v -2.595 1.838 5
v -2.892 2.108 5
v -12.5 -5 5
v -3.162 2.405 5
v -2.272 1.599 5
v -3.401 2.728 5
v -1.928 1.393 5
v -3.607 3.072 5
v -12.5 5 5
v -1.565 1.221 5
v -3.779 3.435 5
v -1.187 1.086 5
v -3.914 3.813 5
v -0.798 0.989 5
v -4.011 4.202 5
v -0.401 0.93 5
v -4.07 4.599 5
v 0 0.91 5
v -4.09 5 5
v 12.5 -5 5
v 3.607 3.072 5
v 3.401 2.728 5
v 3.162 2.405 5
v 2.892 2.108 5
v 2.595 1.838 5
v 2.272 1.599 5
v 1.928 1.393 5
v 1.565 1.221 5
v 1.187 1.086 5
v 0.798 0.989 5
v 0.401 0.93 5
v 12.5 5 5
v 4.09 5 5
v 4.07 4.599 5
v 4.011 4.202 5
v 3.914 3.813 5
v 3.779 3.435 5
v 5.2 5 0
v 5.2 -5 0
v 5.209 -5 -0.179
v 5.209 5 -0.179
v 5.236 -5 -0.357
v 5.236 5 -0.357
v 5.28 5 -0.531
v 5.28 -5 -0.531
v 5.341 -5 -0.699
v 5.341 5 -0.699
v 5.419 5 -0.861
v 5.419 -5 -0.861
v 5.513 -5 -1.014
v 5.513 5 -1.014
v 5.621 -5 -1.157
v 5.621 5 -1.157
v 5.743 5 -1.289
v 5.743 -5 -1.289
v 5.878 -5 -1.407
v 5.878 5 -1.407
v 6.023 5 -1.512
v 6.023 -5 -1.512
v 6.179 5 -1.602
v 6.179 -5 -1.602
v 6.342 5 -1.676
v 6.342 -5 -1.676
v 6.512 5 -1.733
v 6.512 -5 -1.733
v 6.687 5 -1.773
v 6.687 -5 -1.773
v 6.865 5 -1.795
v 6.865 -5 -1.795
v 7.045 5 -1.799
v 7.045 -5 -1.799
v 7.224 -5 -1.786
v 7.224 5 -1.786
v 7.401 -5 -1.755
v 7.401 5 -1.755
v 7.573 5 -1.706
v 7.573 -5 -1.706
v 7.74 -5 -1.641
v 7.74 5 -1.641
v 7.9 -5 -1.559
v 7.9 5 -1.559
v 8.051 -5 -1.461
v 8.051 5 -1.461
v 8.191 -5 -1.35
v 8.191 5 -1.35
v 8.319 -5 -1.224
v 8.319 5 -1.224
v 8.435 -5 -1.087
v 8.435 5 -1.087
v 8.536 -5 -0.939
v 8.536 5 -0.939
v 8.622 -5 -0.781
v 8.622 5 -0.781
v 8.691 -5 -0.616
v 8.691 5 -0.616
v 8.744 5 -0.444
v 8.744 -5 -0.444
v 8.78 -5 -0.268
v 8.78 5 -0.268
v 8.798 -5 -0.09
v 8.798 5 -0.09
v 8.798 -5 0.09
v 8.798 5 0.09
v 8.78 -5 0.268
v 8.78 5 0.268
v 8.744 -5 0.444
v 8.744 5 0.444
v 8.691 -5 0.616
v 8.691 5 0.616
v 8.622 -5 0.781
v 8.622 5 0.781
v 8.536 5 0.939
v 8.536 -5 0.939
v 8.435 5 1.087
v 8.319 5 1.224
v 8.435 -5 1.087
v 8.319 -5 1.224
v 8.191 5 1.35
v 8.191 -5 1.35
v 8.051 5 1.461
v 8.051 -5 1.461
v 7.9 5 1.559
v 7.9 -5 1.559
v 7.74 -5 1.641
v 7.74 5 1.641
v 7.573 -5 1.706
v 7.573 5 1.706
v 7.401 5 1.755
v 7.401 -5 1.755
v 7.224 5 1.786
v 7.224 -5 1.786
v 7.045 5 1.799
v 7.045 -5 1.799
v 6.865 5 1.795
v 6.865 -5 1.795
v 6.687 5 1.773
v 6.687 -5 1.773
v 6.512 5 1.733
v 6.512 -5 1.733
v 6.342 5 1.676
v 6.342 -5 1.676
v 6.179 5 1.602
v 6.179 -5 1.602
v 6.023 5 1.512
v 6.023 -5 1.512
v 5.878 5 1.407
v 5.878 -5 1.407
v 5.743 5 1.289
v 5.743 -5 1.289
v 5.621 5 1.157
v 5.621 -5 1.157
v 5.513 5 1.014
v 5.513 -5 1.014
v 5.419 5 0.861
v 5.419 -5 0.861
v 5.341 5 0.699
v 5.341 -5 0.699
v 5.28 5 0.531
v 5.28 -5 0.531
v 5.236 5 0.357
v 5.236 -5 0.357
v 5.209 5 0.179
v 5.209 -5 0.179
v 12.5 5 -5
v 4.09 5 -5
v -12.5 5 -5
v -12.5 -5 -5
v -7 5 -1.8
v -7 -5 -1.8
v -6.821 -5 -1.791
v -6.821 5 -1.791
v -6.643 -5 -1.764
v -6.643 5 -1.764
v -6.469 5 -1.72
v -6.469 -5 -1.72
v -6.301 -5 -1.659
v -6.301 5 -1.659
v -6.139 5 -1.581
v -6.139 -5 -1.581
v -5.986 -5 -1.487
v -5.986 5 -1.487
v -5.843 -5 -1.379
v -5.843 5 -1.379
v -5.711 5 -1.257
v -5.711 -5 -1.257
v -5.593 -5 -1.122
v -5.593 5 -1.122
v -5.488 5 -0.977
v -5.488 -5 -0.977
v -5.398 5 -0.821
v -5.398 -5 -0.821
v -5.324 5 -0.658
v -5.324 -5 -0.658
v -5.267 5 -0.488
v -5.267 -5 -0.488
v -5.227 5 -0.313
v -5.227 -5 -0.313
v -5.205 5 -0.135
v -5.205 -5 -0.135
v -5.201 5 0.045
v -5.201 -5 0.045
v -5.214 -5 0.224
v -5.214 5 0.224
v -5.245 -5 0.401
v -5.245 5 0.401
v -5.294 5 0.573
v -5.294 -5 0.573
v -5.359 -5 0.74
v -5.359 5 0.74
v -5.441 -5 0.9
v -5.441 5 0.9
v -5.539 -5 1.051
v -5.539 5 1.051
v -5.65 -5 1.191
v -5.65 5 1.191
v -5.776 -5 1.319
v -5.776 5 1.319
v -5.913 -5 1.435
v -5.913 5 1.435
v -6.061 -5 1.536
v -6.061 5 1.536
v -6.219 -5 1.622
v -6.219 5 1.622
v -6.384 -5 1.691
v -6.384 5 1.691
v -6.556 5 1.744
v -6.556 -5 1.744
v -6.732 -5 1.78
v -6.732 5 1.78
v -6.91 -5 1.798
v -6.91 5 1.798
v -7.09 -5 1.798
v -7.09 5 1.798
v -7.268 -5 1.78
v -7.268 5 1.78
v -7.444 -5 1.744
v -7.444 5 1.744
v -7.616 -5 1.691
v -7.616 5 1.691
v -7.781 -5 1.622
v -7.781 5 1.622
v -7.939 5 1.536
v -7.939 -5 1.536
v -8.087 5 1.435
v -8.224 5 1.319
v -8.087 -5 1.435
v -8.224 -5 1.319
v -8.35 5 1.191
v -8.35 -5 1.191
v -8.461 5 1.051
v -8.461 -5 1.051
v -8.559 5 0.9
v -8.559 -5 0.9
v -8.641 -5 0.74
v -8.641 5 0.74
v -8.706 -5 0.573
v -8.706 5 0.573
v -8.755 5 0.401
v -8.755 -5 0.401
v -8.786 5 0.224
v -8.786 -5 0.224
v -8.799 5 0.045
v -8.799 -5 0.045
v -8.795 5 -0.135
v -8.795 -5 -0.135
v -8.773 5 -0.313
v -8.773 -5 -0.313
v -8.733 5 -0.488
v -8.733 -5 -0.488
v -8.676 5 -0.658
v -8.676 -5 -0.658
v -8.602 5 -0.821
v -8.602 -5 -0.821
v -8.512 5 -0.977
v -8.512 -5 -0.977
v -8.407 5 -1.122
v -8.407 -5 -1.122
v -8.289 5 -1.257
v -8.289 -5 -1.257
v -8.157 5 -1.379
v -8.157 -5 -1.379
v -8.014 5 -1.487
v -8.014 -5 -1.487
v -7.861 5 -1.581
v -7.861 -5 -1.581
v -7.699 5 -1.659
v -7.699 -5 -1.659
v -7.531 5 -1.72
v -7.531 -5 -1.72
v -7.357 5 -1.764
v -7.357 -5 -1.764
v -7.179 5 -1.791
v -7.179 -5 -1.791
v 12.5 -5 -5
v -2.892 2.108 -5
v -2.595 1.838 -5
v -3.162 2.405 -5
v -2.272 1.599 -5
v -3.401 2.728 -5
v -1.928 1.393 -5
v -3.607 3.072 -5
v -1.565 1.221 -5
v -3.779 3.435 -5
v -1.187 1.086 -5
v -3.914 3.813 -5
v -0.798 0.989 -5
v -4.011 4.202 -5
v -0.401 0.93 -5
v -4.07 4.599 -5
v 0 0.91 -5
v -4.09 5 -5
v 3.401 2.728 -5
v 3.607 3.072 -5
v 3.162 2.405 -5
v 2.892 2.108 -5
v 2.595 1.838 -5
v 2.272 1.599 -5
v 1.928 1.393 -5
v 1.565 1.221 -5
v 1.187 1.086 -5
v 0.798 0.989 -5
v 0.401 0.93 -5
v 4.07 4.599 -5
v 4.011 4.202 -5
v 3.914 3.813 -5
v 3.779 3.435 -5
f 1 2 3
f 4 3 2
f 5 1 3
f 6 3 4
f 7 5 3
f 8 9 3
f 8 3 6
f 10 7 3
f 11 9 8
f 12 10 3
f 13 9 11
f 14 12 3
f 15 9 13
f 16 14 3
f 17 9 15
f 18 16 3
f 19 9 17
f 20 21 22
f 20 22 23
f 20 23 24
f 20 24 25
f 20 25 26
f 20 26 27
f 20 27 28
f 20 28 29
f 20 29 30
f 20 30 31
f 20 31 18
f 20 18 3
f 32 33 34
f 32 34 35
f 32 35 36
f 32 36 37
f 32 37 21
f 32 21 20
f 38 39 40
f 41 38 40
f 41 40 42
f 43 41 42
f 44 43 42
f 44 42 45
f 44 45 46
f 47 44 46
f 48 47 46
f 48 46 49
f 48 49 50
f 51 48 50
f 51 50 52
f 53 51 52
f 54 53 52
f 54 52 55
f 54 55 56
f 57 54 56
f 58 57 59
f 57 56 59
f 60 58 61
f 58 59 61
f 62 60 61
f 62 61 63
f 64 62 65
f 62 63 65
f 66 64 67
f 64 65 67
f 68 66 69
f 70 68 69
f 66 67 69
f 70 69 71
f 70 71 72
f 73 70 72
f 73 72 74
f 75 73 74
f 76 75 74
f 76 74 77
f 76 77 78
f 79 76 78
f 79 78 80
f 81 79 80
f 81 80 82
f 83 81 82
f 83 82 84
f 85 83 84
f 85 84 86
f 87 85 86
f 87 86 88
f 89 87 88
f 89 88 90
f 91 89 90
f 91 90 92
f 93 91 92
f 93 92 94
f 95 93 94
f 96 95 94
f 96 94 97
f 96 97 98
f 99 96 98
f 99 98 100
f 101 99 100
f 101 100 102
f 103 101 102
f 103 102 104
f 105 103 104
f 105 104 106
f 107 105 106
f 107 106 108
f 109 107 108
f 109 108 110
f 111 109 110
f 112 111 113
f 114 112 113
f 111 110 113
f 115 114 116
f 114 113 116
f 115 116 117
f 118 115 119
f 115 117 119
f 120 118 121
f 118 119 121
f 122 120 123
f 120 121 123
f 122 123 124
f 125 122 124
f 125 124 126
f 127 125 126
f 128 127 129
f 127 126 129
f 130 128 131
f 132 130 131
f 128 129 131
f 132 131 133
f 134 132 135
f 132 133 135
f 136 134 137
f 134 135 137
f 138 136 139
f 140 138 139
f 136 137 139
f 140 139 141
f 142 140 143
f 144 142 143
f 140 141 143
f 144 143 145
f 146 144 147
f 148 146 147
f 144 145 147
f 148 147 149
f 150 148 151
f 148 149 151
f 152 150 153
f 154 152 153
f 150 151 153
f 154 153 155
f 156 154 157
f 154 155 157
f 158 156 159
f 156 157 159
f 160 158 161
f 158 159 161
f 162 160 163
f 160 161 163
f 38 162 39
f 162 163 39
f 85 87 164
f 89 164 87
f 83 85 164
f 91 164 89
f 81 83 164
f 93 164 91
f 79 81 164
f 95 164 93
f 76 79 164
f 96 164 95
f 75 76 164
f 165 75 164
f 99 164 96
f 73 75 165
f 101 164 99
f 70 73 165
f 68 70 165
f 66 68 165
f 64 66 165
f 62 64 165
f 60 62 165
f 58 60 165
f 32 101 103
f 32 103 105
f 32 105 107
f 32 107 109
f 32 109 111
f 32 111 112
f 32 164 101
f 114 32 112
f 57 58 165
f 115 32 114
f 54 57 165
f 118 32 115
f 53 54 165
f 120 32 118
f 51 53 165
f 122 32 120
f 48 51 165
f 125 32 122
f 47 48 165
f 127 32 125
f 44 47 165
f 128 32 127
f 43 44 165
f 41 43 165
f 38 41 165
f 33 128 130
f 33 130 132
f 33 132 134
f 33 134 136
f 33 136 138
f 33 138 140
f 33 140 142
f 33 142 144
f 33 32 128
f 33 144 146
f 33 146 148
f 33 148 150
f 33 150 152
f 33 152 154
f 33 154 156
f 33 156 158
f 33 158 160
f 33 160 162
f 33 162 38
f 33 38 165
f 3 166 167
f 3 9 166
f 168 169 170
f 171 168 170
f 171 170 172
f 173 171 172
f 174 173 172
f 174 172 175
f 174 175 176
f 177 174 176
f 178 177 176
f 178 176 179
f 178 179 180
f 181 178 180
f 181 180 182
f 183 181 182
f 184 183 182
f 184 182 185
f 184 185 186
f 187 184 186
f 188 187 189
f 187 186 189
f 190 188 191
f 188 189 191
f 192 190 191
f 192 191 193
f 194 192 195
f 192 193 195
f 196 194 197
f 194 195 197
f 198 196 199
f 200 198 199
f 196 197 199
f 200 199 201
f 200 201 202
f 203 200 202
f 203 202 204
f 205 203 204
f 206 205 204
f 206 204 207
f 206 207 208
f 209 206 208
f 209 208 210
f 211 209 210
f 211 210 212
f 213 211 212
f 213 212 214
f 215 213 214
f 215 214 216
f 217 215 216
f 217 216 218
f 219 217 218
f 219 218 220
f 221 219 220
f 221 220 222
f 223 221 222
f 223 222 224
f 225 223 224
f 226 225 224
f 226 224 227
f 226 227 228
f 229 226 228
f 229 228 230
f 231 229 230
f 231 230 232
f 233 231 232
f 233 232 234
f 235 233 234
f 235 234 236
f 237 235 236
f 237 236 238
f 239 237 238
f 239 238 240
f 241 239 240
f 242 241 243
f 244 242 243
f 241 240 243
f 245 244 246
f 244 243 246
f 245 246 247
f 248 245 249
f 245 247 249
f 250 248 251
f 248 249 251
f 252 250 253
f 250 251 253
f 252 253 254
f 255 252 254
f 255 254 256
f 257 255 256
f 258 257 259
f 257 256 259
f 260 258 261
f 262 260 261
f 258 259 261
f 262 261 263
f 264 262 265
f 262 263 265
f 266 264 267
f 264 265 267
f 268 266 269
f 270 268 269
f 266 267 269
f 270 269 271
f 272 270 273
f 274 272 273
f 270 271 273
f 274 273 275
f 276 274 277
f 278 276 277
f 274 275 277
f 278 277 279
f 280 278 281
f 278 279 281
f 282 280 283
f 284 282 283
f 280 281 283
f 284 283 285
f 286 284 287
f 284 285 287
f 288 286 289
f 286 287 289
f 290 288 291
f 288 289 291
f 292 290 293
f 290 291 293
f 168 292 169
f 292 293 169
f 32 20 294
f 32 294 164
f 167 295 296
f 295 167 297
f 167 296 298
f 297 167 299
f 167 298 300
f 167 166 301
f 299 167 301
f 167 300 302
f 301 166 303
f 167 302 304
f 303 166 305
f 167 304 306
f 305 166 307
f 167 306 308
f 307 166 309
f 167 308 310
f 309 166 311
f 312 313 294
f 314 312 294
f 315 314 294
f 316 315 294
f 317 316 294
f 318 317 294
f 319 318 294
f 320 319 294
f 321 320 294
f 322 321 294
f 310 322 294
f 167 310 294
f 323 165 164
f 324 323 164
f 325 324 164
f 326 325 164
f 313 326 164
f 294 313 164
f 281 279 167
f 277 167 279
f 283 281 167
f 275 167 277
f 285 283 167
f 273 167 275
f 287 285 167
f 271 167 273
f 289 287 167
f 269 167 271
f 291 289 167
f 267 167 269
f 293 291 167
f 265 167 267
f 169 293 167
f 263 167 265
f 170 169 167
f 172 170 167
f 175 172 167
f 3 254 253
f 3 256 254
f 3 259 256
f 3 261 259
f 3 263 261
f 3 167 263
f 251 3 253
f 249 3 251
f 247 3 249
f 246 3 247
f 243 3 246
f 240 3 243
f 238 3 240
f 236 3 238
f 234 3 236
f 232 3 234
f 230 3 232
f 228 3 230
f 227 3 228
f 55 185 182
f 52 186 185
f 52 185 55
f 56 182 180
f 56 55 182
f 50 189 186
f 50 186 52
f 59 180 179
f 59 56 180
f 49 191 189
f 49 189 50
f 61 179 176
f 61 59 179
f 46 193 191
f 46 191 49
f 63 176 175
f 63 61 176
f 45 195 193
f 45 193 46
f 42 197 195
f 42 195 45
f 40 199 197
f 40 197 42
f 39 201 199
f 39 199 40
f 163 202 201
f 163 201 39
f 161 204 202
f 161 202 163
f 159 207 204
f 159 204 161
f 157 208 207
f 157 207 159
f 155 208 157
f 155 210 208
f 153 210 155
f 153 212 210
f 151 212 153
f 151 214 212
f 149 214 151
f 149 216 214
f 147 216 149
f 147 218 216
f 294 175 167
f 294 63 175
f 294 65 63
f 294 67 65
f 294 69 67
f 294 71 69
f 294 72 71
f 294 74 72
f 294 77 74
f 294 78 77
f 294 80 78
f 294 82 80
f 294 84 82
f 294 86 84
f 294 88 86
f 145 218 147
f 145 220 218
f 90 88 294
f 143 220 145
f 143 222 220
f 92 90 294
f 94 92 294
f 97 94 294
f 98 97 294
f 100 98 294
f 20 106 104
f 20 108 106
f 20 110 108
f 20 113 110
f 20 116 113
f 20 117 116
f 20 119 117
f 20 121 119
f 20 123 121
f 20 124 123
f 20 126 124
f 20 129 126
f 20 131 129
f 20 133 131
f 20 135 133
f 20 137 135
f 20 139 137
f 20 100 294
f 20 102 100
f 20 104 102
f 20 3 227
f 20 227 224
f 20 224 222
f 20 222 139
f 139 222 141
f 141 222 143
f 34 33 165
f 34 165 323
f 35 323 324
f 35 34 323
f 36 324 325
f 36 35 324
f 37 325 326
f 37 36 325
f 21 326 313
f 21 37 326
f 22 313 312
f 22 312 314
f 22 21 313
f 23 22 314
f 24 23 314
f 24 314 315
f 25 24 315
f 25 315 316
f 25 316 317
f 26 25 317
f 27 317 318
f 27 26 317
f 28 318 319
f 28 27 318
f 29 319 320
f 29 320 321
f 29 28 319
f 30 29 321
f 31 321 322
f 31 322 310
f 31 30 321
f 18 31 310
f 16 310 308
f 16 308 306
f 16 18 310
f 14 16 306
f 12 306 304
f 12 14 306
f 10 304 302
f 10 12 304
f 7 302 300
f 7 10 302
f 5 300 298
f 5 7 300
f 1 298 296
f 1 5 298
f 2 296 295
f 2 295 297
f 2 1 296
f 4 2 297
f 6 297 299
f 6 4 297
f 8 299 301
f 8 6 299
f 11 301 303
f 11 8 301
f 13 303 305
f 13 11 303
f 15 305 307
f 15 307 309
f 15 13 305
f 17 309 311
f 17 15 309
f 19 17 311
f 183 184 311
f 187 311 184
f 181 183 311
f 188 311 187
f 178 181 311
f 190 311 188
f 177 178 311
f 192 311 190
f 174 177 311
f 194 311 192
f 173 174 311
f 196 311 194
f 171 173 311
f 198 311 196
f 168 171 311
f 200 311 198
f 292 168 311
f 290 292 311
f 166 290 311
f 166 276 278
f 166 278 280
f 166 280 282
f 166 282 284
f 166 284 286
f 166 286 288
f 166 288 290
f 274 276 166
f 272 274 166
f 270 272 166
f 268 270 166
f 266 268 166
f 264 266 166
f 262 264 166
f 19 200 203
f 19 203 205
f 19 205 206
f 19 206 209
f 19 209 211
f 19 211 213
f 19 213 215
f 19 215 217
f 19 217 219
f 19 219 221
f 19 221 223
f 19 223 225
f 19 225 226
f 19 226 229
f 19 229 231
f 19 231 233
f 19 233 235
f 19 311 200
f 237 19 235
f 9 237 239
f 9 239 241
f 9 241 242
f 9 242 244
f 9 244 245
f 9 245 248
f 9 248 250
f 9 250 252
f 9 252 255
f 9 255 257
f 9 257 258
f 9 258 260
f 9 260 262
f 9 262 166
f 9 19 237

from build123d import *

# Parameters (mm, degrees)
MAIN_BODY_DEPTH   = 5
SCREW_HOLES_REACH = 18.771
SCHIZZO2_R        = 1.8


with BuildPart() as part:
    # Schizzo1 → Main body (new, symmetric)
    with BuildSketch(Plane.XY):
        with BuildLine():
            Line((-12.5, -5), (12.5, -5))
            Line((12.5, -5), (12.5, 5))
            Line((12.5, 5), (4.09, 5))
            ThreePointArc((4.09, 5), (0, 0.91), (-4.09, 5))
            Line((-4.09, 5), (-12.5, 5))
            Line((-12.5, 5), (-12.5, -5))
        make_face()
    extrude(amount=MAIN_BODY_DEPTH, both=True)

    # Schizzo2 → screw holes (cut, up to next)
    with BuildSketch(Plane.XZ.offset(5), mode=Mode.PRIVATE) as screw_holes_sk1:
        with Locations((-7, 0)):
            Circle(SCHIZZO2_R)
    screw_holes_tool1 = extrude(screw_holes_sk1.sketch, amount=-SCREW_HOLES_REACH, mode=Mode.PRIVATE) & part.part
    # Schizzo2 → screw holes (cut, up to next)
    with BuildSketch(Plane.XZ.offset(5), mode=Mode.PRIVATE) as screw_holes_sk2:
        with Locations((7, 0)):
            Circle(SCHIZZO2_R)
    screw_holes_tool2 = extrude(screw_holes_sk2.sketch, amount=-SCREW_HOLES_REACH, mode=Mode.PRIVATE) & part.part
    add(screw_holes_tool1.solids().sort_by_distance((-7, -5, 0))[0], mode=Mode.SUBTRACT)
    add(screw_holes_tool2.solids().sort_by_distance((7, -5, 0))[0], mode=Mode.SUBTRACT)


solid = part.part
